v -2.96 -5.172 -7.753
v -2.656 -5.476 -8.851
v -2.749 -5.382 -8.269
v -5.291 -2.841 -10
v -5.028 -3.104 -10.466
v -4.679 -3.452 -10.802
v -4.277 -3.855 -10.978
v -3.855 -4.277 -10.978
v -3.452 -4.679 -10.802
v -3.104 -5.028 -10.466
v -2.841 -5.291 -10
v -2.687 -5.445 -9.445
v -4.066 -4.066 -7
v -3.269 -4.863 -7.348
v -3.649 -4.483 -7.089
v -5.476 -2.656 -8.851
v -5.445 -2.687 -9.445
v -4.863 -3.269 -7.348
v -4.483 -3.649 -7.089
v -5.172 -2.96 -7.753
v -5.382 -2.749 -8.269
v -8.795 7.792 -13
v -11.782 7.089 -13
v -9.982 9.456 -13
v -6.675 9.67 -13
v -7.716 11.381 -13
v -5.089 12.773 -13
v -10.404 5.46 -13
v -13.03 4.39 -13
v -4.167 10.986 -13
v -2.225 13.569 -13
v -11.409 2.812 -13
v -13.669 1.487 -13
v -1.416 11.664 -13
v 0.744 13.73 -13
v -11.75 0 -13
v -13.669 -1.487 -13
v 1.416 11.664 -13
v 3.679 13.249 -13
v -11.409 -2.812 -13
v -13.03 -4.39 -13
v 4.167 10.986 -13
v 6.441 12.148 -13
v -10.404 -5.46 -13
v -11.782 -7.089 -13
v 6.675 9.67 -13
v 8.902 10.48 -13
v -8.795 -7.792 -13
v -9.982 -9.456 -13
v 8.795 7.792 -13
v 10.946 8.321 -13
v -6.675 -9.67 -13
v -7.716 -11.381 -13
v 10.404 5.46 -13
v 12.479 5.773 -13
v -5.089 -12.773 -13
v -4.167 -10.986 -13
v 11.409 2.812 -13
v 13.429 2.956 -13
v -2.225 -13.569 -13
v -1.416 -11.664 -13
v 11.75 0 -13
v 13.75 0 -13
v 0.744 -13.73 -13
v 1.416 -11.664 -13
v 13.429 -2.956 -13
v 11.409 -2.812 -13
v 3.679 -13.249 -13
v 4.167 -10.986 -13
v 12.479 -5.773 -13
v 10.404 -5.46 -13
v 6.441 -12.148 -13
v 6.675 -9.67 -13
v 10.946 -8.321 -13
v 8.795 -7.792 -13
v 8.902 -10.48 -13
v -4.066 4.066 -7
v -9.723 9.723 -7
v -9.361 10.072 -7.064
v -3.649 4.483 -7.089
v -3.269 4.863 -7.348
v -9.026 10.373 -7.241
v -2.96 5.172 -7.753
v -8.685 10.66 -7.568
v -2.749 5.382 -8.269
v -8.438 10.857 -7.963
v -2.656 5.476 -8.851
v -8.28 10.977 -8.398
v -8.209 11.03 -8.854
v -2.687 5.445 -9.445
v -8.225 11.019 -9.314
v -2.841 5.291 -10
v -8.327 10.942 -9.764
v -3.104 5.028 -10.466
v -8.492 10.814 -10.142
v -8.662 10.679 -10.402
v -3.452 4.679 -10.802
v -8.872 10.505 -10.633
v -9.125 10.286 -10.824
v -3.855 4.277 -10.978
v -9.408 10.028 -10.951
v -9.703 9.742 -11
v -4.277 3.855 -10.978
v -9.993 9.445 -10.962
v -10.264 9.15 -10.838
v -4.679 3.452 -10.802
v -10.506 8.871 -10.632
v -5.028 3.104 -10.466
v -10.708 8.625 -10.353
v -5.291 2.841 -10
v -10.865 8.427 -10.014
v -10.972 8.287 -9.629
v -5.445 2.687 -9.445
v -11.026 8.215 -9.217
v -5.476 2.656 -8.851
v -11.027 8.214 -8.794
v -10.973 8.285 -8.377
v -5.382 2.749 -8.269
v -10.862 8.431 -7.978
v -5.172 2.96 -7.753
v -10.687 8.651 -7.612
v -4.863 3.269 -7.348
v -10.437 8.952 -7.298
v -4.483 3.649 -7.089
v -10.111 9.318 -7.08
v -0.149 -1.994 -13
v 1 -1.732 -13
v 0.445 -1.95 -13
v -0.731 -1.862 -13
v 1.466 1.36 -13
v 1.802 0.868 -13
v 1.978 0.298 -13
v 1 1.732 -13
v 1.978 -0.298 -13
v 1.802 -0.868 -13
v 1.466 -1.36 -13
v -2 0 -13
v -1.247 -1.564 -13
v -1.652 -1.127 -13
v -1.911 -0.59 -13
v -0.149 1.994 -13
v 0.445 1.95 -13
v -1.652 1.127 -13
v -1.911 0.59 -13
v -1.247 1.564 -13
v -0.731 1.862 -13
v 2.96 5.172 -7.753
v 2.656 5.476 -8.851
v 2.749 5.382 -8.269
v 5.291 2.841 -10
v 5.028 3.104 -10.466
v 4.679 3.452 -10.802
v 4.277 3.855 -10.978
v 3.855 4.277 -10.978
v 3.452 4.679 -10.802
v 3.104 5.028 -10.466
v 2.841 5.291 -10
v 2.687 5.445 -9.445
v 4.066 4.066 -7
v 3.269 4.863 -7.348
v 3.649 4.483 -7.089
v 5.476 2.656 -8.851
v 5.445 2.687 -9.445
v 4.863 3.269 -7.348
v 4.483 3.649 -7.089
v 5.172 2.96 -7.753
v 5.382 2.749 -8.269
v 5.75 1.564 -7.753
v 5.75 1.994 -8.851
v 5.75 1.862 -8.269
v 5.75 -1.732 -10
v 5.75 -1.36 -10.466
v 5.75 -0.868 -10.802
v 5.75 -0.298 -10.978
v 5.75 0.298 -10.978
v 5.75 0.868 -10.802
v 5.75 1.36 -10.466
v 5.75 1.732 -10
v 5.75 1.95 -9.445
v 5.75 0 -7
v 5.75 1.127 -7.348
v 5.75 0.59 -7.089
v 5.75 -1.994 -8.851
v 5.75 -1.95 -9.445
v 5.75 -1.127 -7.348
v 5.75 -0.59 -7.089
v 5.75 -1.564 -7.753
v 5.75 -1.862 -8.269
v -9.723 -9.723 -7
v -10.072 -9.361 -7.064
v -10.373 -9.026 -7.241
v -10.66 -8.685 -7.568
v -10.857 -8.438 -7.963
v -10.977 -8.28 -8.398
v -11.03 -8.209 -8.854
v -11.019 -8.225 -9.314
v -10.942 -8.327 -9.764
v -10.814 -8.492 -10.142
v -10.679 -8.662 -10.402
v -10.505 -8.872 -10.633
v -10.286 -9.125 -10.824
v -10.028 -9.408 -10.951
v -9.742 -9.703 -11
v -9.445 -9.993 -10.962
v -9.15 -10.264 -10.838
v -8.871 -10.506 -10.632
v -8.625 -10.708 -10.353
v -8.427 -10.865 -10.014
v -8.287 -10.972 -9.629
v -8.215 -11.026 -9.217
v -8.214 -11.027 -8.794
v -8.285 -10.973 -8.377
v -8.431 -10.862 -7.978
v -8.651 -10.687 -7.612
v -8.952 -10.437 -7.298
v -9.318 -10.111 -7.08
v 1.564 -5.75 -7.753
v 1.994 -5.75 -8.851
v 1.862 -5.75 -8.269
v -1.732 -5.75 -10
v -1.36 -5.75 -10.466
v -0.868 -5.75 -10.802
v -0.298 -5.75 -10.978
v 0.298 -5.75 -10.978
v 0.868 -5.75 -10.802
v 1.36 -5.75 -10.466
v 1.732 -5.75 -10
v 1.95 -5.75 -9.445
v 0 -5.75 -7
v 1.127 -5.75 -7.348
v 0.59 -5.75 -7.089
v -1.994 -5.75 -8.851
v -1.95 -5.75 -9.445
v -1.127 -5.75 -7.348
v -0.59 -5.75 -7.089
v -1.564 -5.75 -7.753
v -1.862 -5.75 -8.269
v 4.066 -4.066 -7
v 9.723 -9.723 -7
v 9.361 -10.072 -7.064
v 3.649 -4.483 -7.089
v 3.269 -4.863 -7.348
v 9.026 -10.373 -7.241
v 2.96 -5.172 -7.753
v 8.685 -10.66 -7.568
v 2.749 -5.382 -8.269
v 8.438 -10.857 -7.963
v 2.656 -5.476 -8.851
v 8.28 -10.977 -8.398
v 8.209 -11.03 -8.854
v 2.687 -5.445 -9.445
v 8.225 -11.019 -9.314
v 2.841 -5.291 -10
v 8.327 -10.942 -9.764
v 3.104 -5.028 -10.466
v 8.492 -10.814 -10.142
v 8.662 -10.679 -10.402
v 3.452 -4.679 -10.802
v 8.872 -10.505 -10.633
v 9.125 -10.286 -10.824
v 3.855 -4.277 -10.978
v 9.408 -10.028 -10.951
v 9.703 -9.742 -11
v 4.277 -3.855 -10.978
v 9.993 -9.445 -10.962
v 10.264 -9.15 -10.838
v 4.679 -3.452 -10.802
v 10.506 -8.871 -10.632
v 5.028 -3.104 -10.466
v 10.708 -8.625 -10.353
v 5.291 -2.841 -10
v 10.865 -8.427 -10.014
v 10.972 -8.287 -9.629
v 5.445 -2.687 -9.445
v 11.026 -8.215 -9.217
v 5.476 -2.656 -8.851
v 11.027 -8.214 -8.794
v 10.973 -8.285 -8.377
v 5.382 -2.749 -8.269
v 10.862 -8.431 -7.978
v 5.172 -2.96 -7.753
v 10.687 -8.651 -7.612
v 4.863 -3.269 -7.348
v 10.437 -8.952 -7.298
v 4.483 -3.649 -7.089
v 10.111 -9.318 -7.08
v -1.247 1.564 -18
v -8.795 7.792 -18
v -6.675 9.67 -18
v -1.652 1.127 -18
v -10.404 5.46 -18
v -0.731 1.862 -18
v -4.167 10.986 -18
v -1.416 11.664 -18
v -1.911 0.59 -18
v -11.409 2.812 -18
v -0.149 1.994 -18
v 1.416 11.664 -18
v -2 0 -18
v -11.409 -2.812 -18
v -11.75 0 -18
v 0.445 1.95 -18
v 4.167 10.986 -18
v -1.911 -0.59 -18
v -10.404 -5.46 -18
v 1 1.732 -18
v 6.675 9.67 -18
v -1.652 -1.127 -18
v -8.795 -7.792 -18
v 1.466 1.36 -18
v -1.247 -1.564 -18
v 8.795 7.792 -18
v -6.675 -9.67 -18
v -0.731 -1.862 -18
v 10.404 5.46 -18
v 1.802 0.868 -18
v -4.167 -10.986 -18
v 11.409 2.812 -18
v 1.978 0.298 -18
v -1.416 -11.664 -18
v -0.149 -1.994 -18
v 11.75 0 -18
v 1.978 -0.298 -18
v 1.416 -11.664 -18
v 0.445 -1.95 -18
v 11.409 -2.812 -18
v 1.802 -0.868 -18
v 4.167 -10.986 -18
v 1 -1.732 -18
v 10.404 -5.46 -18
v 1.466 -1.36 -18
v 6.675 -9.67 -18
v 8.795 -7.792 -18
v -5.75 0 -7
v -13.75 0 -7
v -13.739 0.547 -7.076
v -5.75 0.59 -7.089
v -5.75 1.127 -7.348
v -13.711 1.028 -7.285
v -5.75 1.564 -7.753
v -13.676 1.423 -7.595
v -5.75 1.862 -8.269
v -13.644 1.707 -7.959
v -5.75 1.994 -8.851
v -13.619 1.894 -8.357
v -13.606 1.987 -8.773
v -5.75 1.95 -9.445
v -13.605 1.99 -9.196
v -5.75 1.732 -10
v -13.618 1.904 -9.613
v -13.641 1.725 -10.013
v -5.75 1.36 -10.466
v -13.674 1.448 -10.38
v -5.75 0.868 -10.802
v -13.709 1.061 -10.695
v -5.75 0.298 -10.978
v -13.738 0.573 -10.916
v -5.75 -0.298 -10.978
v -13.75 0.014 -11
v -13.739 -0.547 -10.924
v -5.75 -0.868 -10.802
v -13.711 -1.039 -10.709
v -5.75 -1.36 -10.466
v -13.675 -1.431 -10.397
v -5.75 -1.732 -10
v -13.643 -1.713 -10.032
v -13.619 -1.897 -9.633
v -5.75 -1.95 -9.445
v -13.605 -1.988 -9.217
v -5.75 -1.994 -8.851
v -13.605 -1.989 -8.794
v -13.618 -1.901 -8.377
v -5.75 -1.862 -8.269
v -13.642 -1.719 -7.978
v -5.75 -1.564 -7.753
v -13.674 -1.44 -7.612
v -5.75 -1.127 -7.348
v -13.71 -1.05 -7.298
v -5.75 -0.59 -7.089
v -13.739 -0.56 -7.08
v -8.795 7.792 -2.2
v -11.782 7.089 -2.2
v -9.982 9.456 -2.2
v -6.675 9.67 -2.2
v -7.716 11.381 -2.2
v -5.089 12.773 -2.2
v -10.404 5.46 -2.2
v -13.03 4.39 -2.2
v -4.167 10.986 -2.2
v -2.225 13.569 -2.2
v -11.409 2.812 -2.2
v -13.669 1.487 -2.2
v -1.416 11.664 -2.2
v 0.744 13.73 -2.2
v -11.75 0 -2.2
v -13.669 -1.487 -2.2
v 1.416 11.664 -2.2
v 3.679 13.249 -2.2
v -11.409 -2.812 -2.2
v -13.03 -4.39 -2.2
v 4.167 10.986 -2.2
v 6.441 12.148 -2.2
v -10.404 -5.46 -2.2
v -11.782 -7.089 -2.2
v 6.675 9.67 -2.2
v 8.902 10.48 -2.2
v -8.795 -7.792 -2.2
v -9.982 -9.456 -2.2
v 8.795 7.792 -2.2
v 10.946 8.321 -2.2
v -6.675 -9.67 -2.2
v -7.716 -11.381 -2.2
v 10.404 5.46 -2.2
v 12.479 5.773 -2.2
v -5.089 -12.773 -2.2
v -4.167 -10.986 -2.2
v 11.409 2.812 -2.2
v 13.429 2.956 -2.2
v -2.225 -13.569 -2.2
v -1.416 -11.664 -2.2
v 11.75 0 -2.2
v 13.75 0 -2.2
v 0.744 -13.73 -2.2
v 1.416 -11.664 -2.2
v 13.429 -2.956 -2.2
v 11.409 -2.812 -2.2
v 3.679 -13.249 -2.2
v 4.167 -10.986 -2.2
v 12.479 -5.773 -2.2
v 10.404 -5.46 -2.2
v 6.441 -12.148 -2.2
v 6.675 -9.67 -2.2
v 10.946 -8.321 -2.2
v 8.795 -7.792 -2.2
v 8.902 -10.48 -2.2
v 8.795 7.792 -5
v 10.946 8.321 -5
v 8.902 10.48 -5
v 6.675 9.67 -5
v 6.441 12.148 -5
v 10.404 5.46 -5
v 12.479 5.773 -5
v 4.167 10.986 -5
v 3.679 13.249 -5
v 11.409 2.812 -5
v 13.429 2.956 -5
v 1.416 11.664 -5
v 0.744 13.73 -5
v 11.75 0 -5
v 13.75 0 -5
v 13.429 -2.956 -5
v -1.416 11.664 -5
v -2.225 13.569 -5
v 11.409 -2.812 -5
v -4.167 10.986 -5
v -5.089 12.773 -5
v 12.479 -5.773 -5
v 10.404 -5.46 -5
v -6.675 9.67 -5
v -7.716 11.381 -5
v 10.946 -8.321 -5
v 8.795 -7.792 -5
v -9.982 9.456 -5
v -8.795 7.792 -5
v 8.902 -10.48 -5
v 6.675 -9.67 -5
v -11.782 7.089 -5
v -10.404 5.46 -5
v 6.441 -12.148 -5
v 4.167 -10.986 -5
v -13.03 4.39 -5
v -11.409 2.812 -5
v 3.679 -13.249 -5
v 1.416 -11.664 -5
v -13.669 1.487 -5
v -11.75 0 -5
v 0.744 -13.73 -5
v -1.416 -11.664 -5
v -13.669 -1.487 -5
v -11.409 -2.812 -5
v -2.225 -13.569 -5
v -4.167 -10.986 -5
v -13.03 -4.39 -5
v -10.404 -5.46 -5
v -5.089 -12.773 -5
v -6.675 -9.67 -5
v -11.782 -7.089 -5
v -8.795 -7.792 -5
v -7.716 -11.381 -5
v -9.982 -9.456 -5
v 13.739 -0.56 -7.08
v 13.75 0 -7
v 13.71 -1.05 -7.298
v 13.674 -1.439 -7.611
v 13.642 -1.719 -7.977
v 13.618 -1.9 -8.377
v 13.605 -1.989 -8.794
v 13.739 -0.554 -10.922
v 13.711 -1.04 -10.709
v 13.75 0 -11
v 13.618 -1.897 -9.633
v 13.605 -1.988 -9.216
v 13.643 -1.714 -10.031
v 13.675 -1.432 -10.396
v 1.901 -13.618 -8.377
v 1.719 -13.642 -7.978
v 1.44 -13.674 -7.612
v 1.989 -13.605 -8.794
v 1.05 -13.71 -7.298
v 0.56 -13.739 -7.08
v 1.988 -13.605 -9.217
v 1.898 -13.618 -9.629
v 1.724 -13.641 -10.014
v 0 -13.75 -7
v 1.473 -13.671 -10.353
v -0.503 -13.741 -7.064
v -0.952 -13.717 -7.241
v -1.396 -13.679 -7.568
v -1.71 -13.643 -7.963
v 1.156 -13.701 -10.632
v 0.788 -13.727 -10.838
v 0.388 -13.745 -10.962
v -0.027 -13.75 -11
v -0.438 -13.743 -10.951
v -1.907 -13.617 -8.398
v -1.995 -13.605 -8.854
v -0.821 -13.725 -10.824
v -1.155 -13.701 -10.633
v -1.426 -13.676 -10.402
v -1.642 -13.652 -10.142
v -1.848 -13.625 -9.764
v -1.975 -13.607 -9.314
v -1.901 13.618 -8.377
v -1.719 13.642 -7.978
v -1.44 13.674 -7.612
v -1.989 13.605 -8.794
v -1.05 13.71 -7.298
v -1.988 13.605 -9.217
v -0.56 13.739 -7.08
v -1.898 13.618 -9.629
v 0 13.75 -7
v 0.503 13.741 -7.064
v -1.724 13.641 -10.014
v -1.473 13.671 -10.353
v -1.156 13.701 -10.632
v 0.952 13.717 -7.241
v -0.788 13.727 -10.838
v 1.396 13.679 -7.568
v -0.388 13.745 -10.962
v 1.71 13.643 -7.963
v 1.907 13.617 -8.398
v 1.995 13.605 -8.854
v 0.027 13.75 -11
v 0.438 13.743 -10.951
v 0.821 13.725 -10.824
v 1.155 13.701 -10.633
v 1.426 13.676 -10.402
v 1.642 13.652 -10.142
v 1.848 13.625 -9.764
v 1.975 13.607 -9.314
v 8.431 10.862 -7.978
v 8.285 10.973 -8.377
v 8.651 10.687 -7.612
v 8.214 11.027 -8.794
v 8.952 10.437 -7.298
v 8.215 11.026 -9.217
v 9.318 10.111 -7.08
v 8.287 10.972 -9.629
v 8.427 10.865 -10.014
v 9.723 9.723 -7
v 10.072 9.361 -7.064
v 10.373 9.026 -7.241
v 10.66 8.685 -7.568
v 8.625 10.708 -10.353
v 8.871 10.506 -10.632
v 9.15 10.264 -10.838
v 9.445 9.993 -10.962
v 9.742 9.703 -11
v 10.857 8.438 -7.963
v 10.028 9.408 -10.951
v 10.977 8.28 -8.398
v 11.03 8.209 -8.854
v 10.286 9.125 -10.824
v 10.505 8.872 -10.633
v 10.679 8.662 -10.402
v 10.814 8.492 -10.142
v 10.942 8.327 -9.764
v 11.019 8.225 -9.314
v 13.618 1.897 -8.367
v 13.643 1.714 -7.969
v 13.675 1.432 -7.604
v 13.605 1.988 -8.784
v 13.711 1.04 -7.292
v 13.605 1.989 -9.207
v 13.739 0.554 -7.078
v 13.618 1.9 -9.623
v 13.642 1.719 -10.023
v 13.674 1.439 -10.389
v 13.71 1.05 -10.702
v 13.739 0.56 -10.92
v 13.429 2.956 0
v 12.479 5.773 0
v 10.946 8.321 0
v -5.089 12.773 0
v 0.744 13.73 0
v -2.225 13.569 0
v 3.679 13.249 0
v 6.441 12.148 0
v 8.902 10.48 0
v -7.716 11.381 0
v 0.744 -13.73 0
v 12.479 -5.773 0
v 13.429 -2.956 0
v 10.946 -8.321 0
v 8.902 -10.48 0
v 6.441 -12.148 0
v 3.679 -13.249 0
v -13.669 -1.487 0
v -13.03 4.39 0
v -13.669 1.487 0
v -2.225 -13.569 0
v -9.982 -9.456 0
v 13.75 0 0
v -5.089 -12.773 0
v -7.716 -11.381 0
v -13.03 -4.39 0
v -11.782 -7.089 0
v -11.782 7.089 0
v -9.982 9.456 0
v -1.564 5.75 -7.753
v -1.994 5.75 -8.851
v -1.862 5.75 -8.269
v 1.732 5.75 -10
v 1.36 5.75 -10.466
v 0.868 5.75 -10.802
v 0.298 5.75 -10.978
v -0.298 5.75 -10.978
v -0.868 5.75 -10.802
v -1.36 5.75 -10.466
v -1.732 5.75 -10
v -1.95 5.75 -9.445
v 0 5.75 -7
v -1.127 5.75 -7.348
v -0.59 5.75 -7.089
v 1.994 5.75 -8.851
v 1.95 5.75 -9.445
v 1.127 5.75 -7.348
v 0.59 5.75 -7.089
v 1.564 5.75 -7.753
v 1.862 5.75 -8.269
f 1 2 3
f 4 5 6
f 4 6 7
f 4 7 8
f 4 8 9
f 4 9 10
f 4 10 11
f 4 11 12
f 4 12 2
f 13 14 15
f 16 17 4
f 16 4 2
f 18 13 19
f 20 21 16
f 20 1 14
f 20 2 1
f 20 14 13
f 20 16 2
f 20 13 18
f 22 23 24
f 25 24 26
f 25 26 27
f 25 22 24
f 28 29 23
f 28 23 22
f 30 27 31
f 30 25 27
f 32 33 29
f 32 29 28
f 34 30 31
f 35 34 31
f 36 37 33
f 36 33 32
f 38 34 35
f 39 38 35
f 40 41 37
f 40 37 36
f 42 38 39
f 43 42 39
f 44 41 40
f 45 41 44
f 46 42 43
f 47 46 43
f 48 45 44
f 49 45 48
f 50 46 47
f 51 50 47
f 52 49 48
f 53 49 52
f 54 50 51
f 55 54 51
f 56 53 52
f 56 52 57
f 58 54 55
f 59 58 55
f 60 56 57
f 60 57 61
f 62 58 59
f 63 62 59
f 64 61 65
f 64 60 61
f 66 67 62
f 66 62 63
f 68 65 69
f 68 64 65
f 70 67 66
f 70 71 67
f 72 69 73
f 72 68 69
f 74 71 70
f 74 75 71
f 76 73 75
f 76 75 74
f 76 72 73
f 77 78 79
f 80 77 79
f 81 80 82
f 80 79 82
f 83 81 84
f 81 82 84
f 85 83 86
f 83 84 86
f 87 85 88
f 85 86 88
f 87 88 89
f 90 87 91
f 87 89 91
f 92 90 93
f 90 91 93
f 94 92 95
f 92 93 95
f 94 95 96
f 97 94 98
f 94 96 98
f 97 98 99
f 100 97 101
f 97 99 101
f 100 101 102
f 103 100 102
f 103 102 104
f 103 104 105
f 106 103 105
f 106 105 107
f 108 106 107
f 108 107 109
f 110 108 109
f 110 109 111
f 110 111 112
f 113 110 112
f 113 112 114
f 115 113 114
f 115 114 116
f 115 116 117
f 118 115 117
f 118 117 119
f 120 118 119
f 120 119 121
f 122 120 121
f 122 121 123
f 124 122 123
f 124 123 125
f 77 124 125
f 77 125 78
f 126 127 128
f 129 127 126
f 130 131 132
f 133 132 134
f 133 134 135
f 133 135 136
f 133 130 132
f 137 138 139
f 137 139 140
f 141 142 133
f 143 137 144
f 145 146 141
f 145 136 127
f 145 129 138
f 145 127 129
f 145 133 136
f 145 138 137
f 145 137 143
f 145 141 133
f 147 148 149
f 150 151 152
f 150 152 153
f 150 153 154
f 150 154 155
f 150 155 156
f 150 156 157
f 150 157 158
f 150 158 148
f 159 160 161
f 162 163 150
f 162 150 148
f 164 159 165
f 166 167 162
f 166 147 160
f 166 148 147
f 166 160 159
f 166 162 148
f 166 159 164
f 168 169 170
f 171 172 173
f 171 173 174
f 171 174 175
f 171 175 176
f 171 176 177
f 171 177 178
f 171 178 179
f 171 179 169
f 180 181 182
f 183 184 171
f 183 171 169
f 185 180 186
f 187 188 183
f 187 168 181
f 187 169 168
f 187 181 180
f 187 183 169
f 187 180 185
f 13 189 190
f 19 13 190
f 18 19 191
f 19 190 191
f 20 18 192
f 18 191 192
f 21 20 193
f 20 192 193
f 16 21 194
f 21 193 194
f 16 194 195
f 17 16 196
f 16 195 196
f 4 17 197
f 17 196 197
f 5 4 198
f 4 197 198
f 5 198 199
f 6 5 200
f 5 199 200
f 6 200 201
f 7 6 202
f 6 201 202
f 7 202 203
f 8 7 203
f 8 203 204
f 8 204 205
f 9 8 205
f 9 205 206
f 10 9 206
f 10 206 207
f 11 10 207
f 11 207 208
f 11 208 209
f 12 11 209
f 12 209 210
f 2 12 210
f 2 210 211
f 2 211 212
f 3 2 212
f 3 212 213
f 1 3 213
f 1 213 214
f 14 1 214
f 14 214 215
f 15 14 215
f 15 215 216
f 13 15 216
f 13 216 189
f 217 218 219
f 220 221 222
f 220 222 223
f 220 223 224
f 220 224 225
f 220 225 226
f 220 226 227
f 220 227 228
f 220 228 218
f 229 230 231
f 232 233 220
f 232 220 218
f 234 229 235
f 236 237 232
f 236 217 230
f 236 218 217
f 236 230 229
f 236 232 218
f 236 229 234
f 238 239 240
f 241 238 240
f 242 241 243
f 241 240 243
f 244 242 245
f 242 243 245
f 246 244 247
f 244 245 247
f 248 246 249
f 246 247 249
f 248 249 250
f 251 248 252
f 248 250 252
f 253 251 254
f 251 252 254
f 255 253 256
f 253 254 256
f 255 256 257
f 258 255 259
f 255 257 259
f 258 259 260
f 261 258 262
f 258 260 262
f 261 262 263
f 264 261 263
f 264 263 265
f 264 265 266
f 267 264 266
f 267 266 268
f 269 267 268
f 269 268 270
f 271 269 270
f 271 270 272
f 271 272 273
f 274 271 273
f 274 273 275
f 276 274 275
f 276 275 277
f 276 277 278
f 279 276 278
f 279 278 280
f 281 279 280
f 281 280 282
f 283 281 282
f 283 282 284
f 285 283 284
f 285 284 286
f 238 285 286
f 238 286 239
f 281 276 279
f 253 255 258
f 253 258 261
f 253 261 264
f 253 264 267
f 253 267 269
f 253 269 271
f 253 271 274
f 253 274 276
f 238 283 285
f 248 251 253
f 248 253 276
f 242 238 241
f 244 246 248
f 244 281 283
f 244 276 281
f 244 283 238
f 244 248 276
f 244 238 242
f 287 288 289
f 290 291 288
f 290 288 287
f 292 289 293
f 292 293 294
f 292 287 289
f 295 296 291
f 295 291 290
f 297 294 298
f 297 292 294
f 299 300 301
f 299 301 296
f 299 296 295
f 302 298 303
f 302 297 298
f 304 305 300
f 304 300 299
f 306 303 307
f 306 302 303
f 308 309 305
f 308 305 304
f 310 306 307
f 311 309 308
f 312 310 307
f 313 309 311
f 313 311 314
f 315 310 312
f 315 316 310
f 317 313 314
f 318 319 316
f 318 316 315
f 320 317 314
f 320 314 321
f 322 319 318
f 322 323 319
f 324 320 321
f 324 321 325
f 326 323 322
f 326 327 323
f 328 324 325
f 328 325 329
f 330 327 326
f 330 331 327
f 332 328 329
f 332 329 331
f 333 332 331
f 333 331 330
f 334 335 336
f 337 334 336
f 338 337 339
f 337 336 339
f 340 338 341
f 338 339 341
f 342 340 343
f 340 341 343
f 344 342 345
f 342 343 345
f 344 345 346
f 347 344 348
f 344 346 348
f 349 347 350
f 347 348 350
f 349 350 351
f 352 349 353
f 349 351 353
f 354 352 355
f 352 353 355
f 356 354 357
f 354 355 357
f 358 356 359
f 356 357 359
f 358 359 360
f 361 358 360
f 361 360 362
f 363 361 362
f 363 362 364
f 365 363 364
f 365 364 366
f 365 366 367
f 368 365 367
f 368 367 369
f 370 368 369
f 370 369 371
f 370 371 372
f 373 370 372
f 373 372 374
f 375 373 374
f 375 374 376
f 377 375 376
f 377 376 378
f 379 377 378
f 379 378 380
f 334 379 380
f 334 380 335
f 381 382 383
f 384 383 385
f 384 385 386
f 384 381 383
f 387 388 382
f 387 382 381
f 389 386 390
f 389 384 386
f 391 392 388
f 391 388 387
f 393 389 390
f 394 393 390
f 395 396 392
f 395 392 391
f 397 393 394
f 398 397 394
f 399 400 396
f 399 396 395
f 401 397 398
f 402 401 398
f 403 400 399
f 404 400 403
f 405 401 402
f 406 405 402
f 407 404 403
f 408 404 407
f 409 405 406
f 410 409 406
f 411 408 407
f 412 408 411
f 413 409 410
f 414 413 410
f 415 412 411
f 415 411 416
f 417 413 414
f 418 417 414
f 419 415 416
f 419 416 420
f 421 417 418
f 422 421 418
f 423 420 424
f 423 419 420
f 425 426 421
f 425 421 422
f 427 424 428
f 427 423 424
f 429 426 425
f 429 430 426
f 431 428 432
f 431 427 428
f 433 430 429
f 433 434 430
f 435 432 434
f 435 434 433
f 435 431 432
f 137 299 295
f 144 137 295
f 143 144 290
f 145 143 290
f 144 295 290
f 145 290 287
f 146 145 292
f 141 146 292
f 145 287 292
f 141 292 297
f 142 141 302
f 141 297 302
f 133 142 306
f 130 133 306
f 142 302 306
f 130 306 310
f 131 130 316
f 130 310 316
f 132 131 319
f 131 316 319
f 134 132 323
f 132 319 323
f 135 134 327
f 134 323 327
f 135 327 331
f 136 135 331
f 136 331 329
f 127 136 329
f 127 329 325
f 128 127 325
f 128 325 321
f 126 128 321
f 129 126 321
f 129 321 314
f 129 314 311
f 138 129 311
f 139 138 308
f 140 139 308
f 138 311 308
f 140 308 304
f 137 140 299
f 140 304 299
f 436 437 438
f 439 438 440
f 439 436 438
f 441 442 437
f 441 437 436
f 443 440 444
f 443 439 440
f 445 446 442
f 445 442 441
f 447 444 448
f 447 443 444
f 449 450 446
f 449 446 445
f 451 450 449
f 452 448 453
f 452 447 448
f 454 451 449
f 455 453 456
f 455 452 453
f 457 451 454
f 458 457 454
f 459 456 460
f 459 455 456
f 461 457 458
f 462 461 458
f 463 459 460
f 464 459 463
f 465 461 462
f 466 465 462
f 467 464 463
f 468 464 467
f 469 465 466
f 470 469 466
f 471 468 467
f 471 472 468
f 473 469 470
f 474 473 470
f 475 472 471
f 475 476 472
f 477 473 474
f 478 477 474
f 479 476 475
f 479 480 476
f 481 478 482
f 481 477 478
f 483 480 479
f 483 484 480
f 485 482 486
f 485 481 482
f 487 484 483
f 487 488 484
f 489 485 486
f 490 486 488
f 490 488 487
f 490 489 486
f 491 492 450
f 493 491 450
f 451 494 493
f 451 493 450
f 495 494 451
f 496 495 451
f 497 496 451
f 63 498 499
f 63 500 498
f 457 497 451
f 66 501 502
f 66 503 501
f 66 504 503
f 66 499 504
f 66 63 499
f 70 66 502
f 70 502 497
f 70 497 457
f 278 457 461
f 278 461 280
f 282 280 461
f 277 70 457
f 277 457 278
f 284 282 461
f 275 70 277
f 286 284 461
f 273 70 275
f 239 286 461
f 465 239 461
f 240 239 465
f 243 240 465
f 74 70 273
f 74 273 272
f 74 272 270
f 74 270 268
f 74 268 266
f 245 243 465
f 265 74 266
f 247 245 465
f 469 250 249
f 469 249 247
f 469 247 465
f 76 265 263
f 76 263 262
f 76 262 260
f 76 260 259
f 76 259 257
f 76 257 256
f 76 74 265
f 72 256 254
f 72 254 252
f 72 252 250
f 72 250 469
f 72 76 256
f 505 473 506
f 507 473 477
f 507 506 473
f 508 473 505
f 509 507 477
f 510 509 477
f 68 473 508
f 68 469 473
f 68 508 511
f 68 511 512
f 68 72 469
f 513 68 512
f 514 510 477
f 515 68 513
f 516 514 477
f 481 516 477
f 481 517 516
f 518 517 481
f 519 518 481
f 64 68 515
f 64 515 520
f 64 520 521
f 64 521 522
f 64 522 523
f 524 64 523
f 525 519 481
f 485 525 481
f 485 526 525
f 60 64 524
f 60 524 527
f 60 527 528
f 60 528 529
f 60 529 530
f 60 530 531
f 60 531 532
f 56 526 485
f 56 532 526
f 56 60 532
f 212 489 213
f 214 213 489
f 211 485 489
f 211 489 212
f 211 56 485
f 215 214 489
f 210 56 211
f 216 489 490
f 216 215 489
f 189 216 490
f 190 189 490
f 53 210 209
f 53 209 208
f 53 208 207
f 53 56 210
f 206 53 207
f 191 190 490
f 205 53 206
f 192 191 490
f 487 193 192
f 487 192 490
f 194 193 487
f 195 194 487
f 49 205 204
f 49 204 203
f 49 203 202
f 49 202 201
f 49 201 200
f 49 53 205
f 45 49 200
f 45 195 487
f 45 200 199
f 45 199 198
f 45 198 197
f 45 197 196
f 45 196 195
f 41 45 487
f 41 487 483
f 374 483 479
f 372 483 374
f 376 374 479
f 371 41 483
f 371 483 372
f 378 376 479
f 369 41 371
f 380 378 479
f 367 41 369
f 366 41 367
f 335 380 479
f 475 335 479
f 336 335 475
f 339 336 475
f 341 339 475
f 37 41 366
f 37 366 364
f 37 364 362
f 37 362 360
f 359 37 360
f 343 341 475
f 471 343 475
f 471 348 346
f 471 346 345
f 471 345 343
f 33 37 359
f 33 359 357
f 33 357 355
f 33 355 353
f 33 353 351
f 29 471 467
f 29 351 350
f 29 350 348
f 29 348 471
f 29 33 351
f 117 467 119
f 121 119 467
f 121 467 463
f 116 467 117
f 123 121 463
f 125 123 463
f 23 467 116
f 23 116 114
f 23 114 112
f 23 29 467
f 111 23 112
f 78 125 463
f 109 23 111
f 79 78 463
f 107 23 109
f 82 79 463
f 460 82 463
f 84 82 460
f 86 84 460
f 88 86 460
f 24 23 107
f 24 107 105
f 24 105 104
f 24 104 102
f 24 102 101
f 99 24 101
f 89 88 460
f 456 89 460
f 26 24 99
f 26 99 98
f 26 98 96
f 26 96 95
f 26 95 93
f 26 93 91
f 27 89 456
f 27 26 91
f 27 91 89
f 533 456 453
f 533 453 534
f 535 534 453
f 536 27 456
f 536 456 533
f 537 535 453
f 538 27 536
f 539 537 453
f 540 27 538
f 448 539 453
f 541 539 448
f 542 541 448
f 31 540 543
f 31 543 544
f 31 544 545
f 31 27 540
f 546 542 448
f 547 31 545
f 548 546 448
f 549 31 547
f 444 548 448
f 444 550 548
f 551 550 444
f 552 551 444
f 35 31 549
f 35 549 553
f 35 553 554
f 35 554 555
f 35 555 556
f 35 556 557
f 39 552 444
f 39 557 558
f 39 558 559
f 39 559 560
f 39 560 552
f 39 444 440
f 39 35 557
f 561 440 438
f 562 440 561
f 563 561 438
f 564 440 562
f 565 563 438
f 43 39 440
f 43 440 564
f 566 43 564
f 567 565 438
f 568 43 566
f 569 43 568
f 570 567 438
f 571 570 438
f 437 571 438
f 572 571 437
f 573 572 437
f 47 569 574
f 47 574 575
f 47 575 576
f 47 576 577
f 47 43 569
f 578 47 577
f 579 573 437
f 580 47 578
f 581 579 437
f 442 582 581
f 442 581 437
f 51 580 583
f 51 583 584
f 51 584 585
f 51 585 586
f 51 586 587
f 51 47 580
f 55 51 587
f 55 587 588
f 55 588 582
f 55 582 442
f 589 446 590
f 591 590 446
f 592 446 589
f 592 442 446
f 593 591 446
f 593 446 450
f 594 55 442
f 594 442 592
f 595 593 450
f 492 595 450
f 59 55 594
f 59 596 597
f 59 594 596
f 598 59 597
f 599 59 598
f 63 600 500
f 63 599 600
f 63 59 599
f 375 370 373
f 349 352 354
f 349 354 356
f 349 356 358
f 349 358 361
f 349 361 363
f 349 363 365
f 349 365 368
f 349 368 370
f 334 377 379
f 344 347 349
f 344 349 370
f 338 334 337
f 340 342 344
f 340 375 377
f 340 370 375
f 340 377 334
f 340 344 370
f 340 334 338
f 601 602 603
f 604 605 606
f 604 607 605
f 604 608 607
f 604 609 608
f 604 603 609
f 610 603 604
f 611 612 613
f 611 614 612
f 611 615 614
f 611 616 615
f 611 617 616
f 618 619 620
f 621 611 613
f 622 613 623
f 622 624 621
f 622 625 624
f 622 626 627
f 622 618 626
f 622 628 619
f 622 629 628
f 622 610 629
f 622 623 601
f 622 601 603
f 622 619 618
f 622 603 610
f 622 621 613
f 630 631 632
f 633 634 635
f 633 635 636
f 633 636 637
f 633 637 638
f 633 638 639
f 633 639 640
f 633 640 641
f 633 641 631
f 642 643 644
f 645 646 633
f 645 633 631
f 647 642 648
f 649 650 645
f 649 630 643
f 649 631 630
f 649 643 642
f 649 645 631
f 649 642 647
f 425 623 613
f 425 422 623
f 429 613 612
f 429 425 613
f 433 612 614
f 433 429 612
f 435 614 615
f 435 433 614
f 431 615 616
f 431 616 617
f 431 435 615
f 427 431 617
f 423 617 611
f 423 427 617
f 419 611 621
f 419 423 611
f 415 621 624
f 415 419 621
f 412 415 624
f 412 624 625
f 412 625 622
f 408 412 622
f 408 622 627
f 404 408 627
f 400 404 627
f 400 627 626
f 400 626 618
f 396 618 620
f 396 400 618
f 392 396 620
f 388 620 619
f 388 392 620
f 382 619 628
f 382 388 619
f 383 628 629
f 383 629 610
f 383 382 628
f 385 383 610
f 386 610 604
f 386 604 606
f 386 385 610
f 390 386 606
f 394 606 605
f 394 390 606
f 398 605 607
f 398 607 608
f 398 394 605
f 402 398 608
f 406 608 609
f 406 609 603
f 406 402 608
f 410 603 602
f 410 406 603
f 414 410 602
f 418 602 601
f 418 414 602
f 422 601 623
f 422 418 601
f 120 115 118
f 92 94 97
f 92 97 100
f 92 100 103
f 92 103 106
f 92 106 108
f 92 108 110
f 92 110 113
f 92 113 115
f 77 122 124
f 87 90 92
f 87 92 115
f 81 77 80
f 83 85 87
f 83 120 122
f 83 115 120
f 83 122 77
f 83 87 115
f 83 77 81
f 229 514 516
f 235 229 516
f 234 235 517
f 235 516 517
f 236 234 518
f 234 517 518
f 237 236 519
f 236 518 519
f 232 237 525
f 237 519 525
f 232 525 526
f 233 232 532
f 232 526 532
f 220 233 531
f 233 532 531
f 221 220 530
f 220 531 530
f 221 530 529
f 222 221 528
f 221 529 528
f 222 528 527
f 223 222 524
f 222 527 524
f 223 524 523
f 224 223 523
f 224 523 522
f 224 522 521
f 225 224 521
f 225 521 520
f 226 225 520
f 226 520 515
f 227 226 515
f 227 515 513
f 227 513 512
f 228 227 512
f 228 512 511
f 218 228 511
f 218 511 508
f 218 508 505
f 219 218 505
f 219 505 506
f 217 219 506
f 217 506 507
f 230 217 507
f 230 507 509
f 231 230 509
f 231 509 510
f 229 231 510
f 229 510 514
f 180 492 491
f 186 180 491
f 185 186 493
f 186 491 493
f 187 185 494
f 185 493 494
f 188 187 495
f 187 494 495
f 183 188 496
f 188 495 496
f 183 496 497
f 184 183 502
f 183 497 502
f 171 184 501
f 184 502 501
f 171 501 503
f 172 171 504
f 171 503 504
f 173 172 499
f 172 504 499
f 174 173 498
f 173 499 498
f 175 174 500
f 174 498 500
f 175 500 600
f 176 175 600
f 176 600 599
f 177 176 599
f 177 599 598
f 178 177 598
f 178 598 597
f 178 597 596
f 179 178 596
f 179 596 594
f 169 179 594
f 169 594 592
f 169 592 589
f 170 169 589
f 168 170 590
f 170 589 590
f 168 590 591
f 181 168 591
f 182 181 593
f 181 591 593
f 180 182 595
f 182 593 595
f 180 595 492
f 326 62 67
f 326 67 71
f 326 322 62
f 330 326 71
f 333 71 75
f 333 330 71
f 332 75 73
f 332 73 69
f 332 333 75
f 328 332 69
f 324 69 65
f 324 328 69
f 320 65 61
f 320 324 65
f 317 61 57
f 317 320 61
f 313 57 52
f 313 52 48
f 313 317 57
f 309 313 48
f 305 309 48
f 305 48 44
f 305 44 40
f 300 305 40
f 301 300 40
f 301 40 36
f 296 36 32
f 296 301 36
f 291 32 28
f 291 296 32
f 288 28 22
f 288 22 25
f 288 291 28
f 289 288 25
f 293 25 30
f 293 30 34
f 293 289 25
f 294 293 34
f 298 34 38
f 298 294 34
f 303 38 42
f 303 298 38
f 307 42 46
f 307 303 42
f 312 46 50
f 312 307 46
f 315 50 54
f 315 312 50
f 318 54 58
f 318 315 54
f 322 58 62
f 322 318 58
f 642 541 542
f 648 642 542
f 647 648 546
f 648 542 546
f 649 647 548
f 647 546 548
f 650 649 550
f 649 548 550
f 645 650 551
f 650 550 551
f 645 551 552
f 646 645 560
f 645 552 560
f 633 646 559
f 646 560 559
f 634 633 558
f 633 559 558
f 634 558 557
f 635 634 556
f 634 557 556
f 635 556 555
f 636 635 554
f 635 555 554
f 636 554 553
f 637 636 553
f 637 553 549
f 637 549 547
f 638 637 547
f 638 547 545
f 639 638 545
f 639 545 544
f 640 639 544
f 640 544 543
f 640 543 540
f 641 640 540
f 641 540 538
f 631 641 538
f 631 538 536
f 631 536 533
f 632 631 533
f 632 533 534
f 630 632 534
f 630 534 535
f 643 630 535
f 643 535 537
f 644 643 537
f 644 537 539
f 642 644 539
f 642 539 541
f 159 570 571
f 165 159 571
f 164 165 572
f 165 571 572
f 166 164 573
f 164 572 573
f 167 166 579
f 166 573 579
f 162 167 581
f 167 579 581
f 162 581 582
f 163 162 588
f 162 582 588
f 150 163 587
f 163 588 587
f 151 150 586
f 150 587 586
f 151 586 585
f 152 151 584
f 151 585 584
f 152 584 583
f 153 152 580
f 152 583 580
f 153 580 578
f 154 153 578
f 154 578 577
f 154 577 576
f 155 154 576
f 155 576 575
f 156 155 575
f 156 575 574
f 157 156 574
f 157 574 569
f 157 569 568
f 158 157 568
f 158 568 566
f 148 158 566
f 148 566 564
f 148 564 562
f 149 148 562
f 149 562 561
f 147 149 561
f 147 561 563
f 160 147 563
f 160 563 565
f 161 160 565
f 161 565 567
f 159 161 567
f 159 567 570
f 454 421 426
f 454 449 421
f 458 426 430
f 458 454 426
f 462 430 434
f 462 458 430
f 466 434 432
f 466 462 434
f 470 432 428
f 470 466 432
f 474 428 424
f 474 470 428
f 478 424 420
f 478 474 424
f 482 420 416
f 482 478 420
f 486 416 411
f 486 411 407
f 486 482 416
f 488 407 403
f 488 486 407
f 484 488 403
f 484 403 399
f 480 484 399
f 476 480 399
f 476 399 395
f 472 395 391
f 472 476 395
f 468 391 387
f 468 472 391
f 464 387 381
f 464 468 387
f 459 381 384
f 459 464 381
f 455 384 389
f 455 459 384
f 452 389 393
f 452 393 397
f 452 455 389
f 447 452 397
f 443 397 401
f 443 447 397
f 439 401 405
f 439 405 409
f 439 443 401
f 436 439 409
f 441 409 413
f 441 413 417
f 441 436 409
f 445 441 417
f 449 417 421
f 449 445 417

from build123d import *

# Parameters (mm, degrees)
ESBO_O3_R             = 2
CORTE_EXTRUS_O1_DEPTH = 8
PADR_OCIRCULAR1_COUNT = 8
ESBO_O4_R             = 2
CORTE_EXTRUS_O2_DEPTH = 5


with BuildPart() as part:
    # Esboço2 → Revolução1 (revolve)
    with BuildSketch(Plane(origin=(0, 0, 0), x_dir=(1, 0, 0), z_dir=(0, 1, 0)), mode=Mode.PRIVATE) as revolu_o1_sk:
        Polygon((0, 0), (-13.75, 0), (-13.75, 2.2), (-11.75, 2.2), (-11.75, 5), (-13.75, 5), (-13.75, 13), (-11.75, 13), (-11.75, 18), (0, 18), align=None)
    revolve(revolu_o1_sk.sketch.rotate(Axis((0, 0, 0), (0, 0, -1)), 180), axis=Axis((0, 0, 0), (0, 0, -1)))

    # Esboço3 → Corte-extrusão1 (cut)
    with BuildSketch(Plane(origin=(0, 13.75, 0), x_dir=(1, 0, 0), z_dir=(0, 1, 0))):
        with Locations(Location((0, 9, 0), (0, 0, 270))):
            Circle(ESBO_O3_R)
    corte_extrus_o1 = extrude(amount=-CORTE_EXTRUS_O1_DEPTH, mode=Mode.SUBTRACT)

    # PadrãoCircular1: Corte-extrusão1 ×8 about axis
    padr_ocircular1_axis = Axis((0, 0, 0), (0, 0, 1))
    for i in range(1, PADR_OCIRCULAR1_COUNT):
        add(corte_extrus_o1.rotate(padr_ocircular1_axis, i * 360 / PADR_OCIRCULAR1_COUNT), mode=Mode.SUBTRACT)

    # Esboço4 → Corte-extrusão2 (cut)
    with BuildSketch(Plane(origin=(0, 0, -18), x_dir=(-1, 0, 0), z_dir=(0, 0, -1))):
        Circle(ESBO_O4_R)
    extrude(amount=-CORTE_EXTRUS_O2_DEPTH, mode=Mode.SUBTRACT)


solid = part.part
